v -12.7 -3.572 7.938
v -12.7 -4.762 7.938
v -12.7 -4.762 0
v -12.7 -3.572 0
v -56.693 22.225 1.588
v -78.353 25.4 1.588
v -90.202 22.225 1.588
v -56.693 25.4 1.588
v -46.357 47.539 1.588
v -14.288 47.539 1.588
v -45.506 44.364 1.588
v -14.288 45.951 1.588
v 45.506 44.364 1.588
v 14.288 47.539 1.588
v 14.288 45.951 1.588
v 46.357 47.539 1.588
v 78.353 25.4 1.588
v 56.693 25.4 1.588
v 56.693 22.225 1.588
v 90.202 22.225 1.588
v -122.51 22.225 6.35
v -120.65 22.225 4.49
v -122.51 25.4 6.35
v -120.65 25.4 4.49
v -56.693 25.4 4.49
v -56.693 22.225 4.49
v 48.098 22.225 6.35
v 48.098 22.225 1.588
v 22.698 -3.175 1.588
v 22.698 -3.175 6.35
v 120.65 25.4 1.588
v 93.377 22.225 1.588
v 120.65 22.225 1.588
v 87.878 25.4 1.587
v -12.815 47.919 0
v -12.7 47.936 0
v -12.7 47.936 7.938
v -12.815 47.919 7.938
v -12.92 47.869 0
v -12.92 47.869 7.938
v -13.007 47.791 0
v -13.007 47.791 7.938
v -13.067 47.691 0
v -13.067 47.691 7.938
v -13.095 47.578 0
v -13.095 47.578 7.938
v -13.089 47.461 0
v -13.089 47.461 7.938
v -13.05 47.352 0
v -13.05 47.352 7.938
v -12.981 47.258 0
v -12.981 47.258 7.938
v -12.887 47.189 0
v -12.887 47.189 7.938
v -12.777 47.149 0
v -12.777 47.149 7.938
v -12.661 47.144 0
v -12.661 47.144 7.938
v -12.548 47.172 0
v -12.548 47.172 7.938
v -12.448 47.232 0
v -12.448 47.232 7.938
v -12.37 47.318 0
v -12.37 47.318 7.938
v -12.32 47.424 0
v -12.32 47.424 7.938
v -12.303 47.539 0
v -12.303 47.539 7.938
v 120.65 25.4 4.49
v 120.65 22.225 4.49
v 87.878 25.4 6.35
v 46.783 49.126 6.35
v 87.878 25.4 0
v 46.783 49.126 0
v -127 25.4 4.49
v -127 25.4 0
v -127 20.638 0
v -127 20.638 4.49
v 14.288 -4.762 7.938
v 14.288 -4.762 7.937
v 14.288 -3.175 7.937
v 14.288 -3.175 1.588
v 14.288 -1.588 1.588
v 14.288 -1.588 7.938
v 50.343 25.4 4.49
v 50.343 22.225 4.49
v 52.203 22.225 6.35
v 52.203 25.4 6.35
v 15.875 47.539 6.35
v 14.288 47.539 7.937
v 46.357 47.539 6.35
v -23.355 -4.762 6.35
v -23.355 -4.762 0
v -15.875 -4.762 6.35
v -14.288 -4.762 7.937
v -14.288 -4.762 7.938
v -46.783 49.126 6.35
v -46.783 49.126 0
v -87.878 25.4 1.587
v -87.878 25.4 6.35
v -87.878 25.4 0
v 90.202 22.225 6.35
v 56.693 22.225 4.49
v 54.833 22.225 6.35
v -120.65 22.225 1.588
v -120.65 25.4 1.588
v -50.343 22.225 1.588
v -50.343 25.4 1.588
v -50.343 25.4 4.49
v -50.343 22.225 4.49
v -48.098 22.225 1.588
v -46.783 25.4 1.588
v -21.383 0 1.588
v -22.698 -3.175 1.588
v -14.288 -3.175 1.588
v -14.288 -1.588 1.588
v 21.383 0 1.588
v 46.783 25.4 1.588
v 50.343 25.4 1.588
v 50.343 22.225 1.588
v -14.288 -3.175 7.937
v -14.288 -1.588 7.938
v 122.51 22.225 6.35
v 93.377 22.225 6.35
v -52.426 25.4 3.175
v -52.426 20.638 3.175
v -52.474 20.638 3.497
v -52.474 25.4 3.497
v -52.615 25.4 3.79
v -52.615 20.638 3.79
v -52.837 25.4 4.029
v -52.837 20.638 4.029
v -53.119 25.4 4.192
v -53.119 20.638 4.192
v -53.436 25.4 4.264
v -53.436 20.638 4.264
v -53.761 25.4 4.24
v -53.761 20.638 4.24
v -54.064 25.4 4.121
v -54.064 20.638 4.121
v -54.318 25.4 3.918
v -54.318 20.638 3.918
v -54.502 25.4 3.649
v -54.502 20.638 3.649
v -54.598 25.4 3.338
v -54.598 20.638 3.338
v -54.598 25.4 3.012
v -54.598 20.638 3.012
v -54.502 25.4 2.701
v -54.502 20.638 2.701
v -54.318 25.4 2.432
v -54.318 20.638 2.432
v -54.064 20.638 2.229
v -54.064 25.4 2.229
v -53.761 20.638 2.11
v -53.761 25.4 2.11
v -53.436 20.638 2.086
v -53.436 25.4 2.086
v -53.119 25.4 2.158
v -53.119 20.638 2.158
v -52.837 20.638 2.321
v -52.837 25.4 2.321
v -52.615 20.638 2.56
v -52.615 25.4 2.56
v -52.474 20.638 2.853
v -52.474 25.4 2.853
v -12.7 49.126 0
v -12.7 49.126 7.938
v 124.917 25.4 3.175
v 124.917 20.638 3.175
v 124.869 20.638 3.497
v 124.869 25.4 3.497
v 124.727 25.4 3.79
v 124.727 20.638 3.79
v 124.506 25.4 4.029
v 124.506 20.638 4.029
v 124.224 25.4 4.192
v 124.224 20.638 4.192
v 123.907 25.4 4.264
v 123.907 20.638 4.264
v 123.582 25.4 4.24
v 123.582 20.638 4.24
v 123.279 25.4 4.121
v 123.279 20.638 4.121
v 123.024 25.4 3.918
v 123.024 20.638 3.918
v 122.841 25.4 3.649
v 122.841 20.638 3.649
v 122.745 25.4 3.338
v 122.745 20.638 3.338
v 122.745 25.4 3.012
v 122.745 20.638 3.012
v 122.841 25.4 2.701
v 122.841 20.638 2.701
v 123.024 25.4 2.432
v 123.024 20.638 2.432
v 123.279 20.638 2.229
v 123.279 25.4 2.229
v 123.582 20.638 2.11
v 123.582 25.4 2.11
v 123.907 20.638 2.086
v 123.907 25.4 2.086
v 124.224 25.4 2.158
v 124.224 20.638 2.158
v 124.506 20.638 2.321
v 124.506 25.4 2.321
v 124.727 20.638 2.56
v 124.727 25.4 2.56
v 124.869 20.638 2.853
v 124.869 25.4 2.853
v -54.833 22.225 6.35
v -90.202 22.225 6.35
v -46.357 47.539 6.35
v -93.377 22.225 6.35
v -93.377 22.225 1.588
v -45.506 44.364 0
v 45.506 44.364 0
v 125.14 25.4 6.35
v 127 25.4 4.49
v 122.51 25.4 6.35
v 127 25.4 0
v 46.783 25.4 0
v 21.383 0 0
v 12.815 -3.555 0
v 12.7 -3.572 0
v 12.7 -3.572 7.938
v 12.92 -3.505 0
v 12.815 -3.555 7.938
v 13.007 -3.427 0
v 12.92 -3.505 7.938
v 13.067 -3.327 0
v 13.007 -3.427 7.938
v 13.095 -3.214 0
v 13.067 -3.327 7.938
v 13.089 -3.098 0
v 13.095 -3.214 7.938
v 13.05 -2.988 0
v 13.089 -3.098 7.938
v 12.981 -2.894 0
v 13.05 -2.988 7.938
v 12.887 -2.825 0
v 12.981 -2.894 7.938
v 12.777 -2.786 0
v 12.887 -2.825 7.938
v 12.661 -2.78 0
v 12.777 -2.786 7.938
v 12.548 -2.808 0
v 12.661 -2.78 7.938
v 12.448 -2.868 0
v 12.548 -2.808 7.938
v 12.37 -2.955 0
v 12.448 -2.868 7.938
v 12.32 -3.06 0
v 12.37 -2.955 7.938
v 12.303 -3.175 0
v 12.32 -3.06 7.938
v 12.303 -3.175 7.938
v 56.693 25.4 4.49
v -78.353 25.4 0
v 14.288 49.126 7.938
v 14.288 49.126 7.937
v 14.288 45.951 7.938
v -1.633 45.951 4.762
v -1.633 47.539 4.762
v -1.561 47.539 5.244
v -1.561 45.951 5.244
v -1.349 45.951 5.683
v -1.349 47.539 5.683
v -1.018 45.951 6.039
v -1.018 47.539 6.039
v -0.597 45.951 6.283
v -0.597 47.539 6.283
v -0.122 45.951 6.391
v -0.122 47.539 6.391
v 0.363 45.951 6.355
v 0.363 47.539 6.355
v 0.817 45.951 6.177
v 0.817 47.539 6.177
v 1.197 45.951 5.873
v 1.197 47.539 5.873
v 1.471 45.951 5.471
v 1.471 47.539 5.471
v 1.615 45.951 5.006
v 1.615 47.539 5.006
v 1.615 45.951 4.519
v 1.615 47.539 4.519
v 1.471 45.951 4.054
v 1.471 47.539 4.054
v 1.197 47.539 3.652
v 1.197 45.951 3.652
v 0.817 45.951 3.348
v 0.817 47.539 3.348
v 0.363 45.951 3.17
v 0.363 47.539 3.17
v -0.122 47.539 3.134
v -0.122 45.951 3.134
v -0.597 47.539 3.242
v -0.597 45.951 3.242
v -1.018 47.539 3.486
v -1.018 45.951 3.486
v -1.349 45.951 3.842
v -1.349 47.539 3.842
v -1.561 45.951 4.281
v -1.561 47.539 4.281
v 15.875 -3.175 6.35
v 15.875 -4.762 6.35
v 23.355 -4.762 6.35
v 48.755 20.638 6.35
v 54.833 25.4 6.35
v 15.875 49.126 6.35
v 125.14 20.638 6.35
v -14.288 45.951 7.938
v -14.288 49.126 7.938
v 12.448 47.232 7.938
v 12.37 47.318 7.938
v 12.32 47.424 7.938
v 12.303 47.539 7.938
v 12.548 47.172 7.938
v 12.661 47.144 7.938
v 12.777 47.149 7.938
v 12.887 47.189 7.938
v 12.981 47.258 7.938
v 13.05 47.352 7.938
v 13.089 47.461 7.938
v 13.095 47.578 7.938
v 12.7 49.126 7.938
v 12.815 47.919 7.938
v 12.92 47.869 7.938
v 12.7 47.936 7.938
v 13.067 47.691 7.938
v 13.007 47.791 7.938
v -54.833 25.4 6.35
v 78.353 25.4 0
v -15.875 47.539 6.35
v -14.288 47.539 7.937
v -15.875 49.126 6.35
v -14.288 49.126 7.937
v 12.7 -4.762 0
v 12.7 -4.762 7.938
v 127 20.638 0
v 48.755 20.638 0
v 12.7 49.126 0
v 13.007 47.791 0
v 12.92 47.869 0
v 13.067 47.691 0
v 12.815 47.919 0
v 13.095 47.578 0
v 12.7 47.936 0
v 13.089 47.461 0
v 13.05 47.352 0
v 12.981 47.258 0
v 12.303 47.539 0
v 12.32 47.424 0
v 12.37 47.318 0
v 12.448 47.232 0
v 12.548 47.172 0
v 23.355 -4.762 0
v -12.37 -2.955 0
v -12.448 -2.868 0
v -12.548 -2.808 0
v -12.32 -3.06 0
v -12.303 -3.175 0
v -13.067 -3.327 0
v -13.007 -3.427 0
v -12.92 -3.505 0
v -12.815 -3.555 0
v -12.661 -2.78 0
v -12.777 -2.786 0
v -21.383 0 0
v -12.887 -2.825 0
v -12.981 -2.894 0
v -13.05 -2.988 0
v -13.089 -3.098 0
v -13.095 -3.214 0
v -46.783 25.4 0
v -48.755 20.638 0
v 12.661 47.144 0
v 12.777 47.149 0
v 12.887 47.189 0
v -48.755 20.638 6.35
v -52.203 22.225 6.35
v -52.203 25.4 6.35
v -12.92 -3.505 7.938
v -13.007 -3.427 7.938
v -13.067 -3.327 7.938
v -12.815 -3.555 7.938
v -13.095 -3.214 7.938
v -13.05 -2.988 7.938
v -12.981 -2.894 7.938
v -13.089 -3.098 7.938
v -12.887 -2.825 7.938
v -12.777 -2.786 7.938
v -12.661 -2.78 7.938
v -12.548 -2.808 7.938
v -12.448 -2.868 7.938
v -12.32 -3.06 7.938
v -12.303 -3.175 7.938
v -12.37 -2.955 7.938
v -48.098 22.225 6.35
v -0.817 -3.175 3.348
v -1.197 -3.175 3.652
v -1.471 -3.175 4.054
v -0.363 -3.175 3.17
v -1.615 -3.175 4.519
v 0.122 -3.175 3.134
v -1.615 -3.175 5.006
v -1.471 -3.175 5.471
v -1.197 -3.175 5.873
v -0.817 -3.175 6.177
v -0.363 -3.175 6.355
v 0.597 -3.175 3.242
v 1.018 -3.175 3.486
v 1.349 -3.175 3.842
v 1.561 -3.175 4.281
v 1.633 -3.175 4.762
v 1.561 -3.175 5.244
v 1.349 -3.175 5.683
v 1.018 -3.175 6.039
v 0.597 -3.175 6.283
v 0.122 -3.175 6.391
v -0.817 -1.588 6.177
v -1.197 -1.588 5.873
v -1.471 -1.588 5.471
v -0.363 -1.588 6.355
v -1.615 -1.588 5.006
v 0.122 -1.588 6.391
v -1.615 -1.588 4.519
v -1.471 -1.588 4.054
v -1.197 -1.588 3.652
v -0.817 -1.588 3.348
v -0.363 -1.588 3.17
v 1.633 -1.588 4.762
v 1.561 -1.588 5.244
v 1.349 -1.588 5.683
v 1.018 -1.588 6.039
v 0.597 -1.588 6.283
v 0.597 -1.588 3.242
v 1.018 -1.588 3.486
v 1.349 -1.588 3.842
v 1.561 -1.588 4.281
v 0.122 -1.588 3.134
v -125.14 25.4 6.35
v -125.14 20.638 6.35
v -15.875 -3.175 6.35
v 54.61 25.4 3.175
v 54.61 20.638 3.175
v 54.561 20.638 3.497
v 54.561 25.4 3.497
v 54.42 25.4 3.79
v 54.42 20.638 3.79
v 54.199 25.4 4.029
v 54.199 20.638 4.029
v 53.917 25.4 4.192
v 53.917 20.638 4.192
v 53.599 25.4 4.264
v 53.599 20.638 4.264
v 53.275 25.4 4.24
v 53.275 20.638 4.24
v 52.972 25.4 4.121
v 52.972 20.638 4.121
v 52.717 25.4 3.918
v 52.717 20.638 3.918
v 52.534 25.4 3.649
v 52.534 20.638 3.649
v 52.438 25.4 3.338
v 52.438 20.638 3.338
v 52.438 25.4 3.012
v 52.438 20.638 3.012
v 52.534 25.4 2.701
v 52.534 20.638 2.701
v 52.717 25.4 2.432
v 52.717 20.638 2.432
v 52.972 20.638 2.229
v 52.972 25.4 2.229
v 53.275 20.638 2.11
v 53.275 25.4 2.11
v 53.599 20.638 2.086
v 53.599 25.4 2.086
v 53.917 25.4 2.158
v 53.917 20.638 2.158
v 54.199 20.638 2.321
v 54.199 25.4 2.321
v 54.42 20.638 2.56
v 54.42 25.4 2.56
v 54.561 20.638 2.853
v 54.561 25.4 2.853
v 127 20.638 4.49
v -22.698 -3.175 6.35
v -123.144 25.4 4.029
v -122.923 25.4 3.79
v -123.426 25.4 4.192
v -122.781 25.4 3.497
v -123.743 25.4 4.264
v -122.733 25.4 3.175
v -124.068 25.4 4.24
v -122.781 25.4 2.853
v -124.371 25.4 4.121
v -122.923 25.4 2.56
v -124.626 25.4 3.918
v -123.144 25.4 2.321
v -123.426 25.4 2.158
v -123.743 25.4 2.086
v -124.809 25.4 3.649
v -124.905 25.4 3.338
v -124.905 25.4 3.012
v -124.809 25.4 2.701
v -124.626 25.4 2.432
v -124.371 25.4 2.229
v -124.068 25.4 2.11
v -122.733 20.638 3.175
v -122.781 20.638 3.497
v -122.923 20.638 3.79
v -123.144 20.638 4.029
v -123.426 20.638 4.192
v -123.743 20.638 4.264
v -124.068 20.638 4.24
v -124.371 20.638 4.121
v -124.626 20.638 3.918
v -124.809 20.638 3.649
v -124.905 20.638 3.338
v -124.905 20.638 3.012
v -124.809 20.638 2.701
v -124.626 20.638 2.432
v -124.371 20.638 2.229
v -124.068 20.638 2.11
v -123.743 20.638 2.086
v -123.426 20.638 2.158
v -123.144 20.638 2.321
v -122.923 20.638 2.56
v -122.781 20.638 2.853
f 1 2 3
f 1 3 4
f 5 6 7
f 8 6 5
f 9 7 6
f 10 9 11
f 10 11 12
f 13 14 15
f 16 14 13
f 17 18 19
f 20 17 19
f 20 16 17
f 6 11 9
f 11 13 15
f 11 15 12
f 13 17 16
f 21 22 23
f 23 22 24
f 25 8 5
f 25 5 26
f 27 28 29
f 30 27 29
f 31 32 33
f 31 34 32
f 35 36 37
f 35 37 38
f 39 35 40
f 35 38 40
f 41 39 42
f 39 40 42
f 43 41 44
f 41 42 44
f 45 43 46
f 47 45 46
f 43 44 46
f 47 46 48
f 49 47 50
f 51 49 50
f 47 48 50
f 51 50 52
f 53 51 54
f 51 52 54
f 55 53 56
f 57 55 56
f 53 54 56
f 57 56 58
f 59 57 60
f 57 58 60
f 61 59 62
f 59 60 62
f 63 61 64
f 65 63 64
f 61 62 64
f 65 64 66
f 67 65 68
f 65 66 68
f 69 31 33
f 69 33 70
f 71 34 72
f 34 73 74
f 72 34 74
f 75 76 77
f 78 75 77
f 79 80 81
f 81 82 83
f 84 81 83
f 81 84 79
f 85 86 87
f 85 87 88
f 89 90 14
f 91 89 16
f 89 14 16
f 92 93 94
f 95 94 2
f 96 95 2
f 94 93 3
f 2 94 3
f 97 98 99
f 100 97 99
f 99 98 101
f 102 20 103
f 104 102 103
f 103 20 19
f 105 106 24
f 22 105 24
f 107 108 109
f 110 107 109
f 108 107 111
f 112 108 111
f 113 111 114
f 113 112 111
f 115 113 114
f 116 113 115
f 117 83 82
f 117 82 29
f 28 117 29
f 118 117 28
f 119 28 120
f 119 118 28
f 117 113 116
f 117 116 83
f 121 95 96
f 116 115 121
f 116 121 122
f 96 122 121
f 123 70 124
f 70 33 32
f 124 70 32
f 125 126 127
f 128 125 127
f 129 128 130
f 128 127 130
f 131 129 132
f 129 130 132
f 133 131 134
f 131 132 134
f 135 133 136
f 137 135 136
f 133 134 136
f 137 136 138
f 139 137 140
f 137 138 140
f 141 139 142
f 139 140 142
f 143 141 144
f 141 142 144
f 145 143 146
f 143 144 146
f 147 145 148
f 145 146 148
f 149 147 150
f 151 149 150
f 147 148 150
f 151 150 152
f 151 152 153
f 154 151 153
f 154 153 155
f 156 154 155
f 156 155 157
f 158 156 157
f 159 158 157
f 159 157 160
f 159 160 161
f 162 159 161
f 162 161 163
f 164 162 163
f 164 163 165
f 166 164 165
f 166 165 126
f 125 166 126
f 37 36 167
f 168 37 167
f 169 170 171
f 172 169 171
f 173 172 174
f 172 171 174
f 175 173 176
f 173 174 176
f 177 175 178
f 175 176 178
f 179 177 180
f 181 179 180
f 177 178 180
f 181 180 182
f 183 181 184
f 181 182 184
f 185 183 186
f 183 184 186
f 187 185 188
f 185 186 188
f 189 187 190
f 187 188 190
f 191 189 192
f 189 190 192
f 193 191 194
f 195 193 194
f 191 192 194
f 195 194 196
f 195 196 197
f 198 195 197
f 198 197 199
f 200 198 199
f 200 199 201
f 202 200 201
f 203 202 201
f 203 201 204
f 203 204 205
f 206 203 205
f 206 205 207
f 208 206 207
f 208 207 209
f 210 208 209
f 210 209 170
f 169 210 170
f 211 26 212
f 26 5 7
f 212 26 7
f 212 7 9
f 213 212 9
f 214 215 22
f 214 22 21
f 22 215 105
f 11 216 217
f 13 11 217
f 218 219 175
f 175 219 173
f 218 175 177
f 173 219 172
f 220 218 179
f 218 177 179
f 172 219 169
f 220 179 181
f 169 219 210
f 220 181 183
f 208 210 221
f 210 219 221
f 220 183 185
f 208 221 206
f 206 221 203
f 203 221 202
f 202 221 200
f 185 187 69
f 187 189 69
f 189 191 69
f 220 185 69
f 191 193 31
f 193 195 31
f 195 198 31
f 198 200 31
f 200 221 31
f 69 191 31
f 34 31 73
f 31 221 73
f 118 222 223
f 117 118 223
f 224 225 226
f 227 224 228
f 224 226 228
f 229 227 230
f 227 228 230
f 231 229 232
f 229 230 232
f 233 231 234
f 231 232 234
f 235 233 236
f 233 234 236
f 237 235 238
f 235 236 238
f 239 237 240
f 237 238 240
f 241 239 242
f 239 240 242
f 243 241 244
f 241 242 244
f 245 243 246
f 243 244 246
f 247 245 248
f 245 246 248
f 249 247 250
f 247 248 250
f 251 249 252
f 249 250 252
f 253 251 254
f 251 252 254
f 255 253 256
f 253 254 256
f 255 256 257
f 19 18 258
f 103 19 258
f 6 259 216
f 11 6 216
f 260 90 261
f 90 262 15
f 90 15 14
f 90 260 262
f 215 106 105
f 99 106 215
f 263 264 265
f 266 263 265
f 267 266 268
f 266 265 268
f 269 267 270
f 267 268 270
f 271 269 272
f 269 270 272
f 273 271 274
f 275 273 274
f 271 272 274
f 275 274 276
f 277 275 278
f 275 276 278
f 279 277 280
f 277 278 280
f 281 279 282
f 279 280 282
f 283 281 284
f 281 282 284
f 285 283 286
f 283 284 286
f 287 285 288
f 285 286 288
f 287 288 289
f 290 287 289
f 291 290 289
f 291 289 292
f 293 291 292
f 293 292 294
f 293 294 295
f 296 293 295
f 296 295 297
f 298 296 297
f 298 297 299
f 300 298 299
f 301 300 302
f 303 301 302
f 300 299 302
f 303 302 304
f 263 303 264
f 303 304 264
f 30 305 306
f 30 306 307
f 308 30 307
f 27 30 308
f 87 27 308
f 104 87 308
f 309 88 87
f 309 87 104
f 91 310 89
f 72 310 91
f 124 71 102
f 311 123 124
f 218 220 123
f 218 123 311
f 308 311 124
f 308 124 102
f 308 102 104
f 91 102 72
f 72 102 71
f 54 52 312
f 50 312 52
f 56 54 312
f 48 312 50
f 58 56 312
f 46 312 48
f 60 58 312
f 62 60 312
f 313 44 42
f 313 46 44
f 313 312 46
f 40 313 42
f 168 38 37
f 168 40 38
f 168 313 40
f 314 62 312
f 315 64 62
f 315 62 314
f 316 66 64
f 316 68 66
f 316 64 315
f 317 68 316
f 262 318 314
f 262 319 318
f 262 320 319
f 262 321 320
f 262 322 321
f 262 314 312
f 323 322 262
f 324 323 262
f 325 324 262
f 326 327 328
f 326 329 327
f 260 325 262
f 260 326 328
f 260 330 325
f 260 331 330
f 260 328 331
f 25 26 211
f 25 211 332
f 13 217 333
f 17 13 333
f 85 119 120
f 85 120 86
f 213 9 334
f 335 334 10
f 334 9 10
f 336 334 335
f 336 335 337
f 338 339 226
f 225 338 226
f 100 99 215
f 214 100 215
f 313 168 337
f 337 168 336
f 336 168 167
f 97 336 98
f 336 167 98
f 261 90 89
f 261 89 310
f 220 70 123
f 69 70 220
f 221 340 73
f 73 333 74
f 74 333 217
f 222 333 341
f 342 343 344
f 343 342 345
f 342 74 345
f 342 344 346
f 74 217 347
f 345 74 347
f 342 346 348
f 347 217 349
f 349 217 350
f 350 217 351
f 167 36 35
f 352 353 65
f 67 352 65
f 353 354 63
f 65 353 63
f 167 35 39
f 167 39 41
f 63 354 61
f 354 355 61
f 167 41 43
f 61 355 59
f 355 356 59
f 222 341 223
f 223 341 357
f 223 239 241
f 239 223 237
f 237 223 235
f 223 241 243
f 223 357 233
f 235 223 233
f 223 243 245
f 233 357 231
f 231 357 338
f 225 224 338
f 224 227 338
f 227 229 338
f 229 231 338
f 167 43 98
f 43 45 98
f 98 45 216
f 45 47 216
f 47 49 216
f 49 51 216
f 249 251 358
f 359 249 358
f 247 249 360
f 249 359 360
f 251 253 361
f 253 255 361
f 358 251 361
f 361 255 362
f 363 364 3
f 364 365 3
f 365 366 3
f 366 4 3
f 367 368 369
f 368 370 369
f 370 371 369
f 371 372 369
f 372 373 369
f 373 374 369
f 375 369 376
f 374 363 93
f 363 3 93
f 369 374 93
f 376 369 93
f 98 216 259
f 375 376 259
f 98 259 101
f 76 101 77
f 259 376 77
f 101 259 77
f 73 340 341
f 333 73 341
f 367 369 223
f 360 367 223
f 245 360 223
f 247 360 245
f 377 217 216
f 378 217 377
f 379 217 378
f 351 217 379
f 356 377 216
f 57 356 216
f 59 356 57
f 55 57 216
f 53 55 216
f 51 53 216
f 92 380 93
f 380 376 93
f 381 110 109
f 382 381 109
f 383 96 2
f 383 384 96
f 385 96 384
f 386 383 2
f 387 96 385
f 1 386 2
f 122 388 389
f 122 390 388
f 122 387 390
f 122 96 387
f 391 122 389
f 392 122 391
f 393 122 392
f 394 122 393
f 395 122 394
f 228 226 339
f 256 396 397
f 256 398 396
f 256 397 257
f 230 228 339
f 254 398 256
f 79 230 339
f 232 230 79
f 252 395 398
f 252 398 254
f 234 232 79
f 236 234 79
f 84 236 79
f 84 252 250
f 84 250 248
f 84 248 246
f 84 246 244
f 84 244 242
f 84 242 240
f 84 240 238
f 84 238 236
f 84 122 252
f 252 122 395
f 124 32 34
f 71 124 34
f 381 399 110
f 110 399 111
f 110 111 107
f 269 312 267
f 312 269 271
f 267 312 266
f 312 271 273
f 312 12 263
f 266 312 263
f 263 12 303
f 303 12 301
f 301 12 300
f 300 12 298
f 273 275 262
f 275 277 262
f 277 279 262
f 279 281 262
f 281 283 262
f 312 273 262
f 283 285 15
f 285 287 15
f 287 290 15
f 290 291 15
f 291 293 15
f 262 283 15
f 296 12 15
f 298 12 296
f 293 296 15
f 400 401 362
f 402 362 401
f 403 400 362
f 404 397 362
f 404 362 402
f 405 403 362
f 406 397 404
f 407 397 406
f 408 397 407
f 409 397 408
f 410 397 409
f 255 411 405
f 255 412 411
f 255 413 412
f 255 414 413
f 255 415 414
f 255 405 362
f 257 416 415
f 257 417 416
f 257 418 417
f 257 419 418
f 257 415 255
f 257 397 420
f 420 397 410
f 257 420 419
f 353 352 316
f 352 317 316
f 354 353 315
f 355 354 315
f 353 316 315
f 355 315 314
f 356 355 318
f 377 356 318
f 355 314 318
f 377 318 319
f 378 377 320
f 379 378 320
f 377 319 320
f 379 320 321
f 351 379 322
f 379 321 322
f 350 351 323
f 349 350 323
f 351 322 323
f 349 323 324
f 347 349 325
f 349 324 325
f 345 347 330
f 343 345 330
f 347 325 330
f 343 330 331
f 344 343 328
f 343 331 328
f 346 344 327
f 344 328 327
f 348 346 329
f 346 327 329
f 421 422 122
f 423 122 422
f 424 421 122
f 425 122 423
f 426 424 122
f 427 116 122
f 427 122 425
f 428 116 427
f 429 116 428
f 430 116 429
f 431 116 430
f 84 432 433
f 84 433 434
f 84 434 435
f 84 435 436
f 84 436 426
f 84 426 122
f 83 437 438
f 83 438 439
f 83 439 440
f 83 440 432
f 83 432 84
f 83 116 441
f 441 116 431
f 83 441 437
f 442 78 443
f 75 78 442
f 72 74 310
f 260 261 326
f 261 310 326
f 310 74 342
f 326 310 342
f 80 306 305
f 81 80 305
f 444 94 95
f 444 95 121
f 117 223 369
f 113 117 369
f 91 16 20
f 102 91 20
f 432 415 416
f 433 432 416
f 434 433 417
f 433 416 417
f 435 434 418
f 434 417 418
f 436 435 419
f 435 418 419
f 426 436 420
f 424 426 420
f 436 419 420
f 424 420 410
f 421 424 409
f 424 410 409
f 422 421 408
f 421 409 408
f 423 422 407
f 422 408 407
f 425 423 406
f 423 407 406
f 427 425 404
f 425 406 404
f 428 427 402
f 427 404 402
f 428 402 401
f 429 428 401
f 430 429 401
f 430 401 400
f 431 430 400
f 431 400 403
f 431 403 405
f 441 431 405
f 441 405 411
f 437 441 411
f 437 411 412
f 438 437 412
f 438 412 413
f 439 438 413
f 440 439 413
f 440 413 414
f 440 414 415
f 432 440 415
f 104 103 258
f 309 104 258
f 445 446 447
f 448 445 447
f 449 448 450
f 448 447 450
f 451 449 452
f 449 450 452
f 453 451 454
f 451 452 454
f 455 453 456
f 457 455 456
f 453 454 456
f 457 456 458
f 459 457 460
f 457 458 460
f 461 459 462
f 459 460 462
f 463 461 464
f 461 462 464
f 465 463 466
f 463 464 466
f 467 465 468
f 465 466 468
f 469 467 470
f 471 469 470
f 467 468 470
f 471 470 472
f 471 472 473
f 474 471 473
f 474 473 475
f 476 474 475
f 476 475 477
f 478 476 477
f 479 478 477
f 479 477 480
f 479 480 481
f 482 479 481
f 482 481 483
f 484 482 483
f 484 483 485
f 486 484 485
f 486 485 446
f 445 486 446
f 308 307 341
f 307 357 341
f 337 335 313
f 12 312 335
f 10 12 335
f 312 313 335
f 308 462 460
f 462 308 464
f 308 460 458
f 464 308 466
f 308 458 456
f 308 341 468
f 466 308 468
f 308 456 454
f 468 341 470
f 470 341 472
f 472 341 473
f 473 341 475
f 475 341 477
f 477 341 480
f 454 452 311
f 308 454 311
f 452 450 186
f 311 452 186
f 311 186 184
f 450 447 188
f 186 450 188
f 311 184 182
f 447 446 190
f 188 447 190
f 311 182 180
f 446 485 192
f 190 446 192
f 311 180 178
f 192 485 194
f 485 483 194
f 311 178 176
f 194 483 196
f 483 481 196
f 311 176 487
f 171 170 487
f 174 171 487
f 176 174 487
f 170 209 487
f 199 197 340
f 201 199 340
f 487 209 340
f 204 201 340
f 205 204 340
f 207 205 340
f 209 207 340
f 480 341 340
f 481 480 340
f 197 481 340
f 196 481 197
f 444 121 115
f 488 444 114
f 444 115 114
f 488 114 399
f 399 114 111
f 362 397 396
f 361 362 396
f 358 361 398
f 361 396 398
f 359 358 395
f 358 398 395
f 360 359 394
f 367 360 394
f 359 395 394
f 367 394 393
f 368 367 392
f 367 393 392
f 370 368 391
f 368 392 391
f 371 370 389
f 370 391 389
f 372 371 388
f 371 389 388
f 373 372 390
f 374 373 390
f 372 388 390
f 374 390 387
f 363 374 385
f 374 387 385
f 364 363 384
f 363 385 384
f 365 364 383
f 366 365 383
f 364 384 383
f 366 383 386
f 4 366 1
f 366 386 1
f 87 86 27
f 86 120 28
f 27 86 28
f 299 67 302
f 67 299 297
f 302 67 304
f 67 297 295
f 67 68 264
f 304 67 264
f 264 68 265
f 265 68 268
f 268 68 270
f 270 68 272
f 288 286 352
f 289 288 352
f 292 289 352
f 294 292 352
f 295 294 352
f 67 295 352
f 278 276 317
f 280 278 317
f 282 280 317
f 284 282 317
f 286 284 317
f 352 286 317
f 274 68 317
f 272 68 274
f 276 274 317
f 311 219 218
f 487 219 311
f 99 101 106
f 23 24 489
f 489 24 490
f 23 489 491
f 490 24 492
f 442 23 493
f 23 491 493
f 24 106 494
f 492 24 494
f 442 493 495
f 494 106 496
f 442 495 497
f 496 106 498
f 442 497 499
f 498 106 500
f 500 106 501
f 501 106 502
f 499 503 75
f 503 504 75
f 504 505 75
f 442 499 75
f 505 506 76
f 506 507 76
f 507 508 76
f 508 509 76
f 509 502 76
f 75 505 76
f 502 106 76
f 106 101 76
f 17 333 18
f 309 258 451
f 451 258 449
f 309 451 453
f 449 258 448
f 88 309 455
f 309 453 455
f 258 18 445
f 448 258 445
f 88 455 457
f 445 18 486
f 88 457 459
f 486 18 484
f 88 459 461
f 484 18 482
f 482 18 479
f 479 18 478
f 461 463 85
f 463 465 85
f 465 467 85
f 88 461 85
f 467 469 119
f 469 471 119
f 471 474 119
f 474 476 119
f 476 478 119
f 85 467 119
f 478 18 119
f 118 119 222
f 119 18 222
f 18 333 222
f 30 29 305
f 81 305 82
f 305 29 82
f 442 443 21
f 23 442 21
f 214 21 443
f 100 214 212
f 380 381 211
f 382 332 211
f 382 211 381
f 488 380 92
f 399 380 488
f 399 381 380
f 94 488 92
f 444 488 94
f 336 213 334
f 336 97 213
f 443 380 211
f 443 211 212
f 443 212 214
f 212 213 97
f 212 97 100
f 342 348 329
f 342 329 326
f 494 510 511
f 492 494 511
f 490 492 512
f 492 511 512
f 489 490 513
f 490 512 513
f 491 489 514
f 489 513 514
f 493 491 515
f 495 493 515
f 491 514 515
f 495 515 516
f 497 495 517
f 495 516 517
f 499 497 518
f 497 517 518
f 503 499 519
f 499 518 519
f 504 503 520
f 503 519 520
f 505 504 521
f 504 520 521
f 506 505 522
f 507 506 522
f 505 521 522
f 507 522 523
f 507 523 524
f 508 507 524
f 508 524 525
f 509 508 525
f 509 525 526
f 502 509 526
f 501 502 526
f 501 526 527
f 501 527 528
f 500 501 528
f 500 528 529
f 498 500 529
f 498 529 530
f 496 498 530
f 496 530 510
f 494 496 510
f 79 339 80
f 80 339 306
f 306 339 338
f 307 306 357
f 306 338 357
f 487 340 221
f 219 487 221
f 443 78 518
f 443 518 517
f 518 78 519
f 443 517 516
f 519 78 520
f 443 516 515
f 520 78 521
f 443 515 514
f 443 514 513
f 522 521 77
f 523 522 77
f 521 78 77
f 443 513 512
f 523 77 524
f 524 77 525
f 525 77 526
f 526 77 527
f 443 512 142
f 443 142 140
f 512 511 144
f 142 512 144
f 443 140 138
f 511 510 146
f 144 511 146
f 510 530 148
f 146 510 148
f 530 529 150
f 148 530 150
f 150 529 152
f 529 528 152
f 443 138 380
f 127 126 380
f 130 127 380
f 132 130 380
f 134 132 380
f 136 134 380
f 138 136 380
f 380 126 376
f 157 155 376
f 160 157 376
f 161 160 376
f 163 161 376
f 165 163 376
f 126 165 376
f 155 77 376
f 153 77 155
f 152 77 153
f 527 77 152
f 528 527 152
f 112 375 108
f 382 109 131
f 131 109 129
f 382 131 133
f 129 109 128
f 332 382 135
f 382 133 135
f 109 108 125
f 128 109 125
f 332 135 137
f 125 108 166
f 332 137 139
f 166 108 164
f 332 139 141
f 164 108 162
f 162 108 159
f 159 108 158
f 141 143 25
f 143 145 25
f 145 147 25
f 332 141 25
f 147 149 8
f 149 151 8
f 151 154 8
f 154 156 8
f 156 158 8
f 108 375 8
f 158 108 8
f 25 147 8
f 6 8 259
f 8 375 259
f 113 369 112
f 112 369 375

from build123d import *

# Parameters (mm, degrees)
F1_DEPTH  = 1.5875
F3_DEPTH  = 4.7625
F4_W      = 6.35
F4_H      = 6.35
F5_DEPTH  = 3.175
F6_SIZE   = 1.8598642
F7_W      = 28.575
F7_H      = 3.175
F8_DEPTH  = 1.5875
F9_W      = 25.4
F9_H      = 1.5875
F10_DEPTH = 7.9375
F11_R     = 1.0922
F11_R_2   = 1.63322
F12_DEPTH = 28.575
F13_SIZE  = 1.58749
F14_R     = 0.396875
F15_DEPTH = 7.9375
F16_R     = 1.63322
F17_DEPTH = 1.5875


# Not quite as in the source:
# - a fillet or chamfer is up to 0.001 mm smaller than in the source, because OpenCascade refuses the exact size


with BuildPart() as f1:
    # F0 (on Top) → F1 (new body)
    with BuildSketch(Plane.XY):
        Polygon((-87.87765, 25.4), (-127, 25.4), (-127, 20.6375), (-48.7553, 20.6375), (-23.3553, -4.7625), (23.3553, -4.7625), (48.7553, 20.6375), (127, 20.6375), (127, 25.4), (87.87765, 25.4), (46.7826079092, 49.1262336135), (-46.7826079092, 49.1262336135), align=None)
        Polygon((-21.3826079092, 0), (-46.7826079092, 25.4), (-78.35265, 25.4), (-45.5064998802, 44.3637336135), (45.5064998802, 44.3637336135), (78.35265, 25.4), (46.7826079092, 25.4), (21.3826079092, 0), align=None, mode=Mode.SUBTRACT)
    extrude(amount=F1_DEPTH)

    # F2 (on face) → F3 (join)
    with BuildSketch(Plane.XY.offset(1.5875)):
        Polygon((-127, 22.225), (-127, 20.6375), (-48.7553, 20.6375), (-23.3553, -4.7625), (23.3553, -4.7625), (48.7553, 20.6375), (127, 20.6375), (127, 22.225), (93.376911314, 22.225), (87.87765, 25.4), (46.7826079092, 49.1262336135), (-46.7826079092, 49.1262336135), (-87.87765, 25.4), (-93.376911314, 22.225), align=None)
        Polygon((90.201911314, 22.225), (48.0977359697, 22.225), (22.6977359697, -3.175), (14.2875, -3.175), (14.2875, -1.5875), (-14.2875, -1.5875), (-14.2875, -3.175), (-22.6977359697, -3.175), (-48.0977359697, 22.225), (-90.201911314, 22.225), (-46.3572385662, 47.5387336135), (-14.2875, 47.5387336135), (-14.2875, 45.9512336135), (14.2875, 45.9512336135), (14.2875, 47.5387336135), (46.3572385662, 47.5387336135), align=None, mode=Mode.SUBTRACT)
    extrude(amount=F3_DEPTH)

    # F4 (on face) → F5 (join, through all)
    with BuildSketch(Plane(origin=(0, 22.225, 0), x_dir=(-1, 0, 0), z_dir=(0, 1, 0))):
        with Locations((-53.5178, 3.175)):
            Rectangle(F4_W, F4_H)
        with Locations((-123.825, 3.175)):
            Rectangle(F4_W, F4_H)
        with Locations((123.825, 3.175)):
            Rectangle(F4_W, F4_H)
        with Locations((53.5178, 3.175)):
            Rectangle(F4_W, F4_H)
    extrude(amount=F5_DEPTH)

    # F6
    f6_edges = [f1.edges().sort_by_distance(p)[0] for p in [
        (-127, 23.01875, 6.35),
        (-120.65, 23.8125, 6.35),
        (-56.6928, 23.8125, 6.35),
        (-50.3428, 23.8125, 6.35),
        (50.3428, 23.8125, 6.35),
        (56.6928, 23.8125, 6.35),
        (120.65, 23.8125, 6.35),
        (127, 23.01875, 6.35),
    ]]
    chamfer(f6_edges, length=F6_SIZE)

    # F7 (on face) → F8 (join)
    with BuildSketch(Plane.XY.offset(6.35)):
        with Locations((0, -3.175)):
            Rectangle(F7_W, F7_H)
        with Locations((0, 47.5387336135)):
            Rectangle(F7_W, F7_H)
    extrude(amount=F8_DEPTH)

    # F9 (on face) → F10 (cut, through all)
    with BuildSketch(Plane.XY.offset(7.9375)):
        with Locations((0, -3.96875)):
            Rectangle(F9_W, F9_H)
        with Locations((0, 48.3324836135)):
            Rectangle(F9_W, F9_H)
    extrude(amount=-F10_DEPTH, mode=Mode.SUBTRACT)

    # F11 (on face) → F12 (cut, through all)
    with BuildSketch(Plane.XZ.offset(3.175)):
        with Locations((53.5178, 3.175)):
            Circle(F11_R)
        with Locations((123.825, 3.175)):
            Circle(F11_R)
        with Locations((-123.825, 3.175)):
            Circle(F11_R)
        with Locations((-53.5178, 3.175)):
            Circle(F11_R)
        with Locations((0, 4.7625)):
            Circle(F11_R_2)
    extrude(amount=-F12_DEPTH, mode=Mode.SUBTRACT)

    # F13 (size 1.5875 in the source; OpenCascade refuses exactly that, so slightly less here)
    f13_edges = [f1.edges().sort_by_distance(p)[0] for p in [
        (-14.2875, -3.96875, 6.35),
        (14.2875, -3.96875, 6.35),
        (-14.2875, 48.332484, 6.35),
        (14.2875, 48.332484, 6.35),
    ]]
    chamfer(f13_edges, length=F13_SIZE)

    # F14 (on face) → F15 (cut, through all)
    with BuildSketch(Plane.XY.offset(7.9375)):
        with Locations((-12.7, -3.175)):
            Circle(F14_R)
        with Locations((12.7, -3.175)):
            Circle(F14_R)
        with Locations((12.7, 47.5387336135)):
            Circle(F14_R)
        with Locations((-12.7, 47.5387336135)):
            Circle(F14_R)
    extrude(amount=-F15_DEPTH, mode=Mode.SUBTRACT)

    # F16 (on face) → F17 (cut, through all)
    with BuildSketch(Plane(origin=(0, 47.5387336135, 0), x_dir=(-1, 0, 0), z_dir=(0, 1, 0))):
        with Locations((0, 4.7625)):
            Circle(F16_R)
    extrude(amount=-F17_DEPTH, mode=Mode.SUBTRACT)


solid = f1.part
